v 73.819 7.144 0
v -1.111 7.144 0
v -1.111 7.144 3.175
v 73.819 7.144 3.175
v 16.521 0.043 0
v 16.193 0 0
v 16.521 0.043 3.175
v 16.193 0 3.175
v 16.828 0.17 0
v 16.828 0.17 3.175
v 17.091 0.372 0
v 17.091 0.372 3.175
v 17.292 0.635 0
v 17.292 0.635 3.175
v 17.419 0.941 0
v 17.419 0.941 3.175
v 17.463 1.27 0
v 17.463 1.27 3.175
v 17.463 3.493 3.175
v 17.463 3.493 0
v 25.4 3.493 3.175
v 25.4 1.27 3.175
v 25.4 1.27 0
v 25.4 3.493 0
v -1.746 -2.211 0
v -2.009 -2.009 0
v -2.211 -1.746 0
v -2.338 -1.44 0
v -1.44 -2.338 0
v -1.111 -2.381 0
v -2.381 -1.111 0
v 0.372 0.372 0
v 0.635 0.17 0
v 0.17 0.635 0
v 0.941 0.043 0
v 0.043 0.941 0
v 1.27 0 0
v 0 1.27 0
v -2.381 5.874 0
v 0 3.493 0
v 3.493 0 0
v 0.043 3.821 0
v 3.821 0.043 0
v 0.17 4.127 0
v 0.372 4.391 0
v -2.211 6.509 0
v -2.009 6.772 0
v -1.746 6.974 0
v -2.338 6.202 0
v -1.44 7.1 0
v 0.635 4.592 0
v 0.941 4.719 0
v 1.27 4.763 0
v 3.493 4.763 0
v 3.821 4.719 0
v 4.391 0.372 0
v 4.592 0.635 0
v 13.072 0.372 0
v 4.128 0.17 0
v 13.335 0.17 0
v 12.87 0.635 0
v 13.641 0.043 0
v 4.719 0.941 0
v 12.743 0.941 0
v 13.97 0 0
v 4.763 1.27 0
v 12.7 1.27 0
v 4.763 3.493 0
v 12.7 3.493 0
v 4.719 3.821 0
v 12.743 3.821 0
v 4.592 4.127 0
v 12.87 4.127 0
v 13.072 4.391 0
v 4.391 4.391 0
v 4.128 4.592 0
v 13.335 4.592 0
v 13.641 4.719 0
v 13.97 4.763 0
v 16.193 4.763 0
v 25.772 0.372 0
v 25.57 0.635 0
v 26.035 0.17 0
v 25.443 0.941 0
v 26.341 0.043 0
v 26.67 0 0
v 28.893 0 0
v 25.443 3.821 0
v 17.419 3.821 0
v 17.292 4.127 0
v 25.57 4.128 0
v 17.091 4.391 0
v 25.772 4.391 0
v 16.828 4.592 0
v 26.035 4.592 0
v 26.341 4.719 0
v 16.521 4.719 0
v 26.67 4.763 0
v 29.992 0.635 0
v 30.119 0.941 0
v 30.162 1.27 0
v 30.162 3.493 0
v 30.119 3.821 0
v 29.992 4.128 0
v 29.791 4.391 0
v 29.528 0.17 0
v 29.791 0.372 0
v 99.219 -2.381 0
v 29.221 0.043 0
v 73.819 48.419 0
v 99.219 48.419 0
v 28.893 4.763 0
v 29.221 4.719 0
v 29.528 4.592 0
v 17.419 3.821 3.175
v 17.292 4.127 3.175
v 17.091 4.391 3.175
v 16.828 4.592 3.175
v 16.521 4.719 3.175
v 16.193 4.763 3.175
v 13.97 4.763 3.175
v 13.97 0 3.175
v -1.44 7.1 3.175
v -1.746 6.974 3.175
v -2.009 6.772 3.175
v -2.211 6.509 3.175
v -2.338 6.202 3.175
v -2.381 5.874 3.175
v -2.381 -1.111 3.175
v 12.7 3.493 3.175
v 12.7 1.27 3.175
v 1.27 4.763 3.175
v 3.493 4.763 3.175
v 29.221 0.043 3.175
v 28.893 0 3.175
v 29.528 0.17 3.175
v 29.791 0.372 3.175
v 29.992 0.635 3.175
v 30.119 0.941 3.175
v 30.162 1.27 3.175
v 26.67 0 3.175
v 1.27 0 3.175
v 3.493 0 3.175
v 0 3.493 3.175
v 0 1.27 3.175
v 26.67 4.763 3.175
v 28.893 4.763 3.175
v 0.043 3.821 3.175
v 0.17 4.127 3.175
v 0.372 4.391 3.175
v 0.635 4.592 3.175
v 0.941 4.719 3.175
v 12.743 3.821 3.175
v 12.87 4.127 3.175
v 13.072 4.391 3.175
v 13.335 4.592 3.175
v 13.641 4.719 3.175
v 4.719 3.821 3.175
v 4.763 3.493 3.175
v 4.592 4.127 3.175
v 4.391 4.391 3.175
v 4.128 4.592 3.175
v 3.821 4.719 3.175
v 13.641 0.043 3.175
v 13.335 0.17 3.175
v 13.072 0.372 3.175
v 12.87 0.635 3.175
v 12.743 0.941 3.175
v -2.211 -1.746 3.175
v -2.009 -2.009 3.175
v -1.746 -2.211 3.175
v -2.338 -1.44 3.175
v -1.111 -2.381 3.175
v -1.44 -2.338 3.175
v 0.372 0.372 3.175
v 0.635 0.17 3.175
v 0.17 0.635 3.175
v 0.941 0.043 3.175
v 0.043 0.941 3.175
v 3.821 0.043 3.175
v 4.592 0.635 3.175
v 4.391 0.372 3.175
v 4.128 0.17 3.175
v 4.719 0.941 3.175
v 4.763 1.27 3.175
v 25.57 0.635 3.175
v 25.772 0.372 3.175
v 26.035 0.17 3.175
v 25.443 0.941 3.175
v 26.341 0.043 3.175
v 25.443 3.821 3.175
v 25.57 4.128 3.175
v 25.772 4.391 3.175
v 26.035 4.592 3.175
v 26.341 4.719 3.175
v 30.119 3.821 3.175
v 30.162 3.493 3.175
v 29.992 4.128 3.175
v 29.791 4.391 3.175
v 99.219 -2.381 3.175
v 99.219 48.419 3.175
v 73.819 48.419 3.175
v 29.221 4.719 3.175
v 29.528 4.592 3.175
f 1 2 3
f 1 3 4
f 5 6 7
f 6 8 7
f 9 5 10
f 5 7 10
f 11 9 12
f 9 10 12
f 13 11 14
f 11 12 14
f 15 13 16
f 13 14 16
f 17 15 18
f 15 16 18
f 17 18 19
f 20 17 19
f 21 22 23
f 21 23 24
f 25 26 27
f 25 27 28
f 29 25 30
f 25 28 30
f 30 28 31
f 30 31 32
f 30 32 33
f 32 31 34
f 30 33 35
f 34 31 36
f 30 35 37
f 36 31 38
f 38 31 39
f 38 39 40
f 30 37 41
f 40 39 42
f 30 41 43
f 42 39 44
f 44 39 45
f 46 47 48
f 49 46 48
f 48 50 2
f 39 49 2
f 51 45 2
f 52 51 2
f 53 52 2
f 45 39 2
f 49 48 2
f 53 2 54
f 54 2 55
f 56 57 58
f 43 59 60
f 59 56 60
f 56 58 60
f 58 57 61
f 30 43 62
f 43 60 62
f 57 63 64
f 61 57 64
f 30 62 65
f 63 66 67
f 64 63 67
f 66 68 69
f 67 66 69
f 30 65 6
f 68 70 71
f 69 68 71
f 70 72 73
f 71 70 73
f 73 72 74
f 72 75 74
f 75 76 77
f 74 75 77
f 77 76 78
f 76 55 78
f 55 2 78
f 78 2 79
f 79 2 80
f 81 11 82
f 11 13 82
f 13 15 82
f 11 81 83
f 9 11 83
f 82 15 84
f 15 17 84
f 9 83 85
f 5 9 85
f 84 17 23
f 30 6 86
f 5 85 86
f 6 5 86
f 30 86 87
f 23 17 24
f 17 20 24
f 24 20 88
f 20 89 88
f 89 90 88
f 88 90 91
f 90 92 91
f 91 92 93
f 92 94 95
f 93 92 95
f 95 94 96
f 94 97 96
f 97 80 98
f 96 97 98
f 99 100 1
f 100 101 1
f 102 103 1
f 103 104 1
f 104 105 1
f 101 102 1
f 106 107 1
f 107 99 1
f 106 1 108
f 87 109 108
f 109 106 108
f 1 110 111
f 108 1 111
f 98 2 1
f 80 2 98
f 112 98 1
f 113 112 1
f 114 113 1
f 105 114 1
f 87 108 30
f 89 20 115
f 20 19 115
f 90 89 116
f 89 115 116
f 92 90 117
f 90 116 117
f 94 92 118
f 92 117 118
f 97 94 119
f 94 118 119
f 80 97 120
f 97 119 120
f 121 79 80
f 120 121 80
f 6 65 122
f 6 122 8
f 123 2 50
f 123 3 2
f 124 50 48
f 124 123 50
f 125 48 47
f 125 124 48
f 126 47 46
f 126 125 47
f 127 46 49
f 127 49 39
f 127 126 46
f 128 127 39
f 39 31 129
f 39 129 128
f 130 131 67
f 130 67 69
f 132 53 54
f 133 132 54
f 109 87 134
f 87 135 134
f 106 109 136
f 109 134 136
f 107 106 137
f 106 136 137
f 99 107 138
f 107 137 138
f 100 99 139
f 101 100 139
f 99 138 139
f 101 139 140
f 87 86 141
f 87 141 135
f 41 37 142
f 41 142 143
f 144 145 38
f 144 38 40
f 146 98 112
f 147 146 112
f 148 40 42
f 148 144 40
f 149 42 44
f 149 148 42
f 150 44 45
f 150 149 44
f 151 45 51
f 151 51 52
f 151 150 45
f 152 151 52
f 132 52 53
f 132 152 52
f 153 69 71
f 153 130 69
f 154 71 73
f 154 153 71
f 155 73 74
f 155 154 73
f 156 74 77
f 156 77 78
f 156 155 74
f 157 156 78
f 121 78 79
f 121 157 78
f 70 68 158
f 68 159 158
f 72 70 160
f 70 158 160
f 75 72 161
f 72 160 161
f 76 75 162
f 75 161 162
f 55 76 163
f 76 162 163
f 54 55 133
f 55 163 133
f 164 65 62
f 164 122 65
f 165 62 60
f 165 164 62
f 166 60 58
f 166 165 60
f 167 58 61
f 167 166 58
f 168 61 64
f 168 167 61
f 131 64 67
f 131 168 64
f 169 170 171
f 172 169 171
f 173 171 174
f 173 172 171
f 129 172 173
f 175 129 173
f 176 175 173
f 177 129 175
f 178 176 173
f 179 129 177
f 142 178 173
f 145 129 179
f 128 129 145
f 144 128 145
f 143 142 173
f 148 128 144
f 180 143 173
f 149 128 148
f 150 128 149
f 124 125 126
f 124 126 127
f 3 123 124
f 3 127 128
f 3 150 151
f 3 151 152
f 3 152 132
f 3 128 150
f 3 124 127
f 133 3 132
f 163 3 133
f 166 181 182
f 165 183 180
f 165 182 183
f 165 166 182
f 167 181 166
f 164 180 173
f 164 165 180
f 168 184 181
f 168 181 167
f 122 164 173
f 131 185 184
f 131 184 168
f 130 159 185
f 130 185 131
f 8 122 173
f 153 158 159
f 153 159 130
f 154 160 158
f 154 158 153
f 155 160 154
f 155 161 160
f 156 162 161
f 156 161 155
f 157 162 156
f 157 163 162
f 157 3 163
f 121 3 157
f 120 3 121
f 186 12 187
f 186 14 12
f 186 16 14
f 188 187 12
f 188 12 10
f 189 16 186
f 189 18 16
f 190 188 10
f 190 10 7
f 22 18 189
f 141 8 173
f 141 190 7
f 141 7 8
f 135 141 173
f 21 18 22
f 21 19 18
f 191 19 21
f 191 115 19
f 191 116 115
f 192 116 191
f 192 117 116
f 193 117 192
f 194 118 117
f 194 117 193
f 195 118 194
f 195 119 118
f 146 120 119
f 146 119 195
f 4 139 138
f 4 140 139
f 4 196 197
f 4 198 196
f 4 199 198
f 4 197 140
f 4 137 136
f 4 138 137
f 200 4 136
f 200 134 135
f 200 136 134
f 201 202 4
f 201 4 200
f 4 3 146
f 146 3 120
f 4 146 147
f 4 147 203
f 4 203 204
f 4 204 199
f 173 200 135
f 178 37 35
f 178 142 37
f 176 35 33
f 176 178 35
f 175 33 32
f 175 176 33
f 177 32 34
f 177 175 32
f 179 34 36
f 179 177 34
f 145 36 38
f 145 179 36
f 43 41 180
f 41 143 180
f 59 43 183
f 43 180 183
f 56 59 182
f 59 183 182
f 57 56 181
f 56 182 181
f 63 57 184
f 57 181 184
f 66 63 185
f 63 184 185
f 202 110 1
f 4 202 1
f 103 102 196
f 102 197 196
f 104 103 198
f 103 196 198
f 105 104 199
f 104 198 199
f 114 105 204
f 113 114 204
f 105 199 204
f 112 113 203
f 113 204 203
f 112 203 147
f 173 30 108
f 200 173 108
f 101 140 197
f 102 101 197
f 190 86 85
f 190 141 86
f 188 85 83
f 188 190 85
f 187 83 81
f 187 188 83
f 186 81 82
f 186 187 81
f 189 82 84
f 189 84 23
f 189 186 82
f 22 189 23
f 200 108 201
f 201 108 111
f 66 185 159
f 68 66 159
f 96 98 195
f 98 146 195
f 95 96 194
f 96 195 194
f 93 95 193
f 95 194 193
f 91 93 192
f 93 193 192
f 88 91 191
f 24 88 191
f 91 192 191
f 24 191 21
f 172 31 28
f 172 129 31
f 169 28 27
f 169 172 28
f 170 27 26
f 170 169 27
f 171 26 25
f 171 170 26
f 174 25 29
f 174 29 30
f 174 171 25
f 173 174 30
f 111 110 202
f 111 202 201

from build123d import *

# Parameters (mm, degrees)
F0_W     = 25.4
F0_H     = 41.275
F0_H_2   = 9.525
F0_W_2   = 76.2
F0_W_3   = 4.7625
F0_H_3   = 4.7625
F1_DEPTH = 3.175
F2_R     = 1.27


with BuildPart() as f1:
    # F0 (on Top) → F1 (new body)
    with BuildSketch(Plane.XY):
        with Locations((86.51875, 27.78125)):
            Rectangle(F0_W, F0_H)
        with Locations((86.51875, 2.38125)):
            Rectangle(F0_W, F0_H_2)
        with Locations((35.71875, 2.38125)):
            Rectangle(F0_W_2, F0_H_2)
        with Locations((2.38125, 2.38125)):
            Rectangle(F0_W_3, F0_H_3, mode=Mode.SUBTRACT)
        with Locations((15.08125, 2.38125)):
            Rectangle(F0_W_3, F0_H_3, mode=Mode.SUBTRACT)
        with Locations((27.78125, 2.38125)):
            Rectangle(F0_W_3, F0_H_3, mode=Mode.SUBTRACT)
    extrude(amount=F1_DEPTH)

    # F2
    f2_edges = [f1.edges().sort_by_distance(p)[0] for p in [
        (-2.38125, -2.38125, 1.5875),
        (0, 4.7625, 1.5875),
        (12.7, 4.7625, 1.5875),
        (25.4, 4.7625, 1.5875),
        (-2.38125, 7.14375, 1.5875),
        (0, 0, 1.5875),
        (12.7, 0, 1.5875),
        (25.4, 0, 1.5875),
        (4.7625, 0, 1.5875),
        (17.4625, 0, 1.5875),
        (30.1625, 0, 1.5875),
        (4.7625, 4.7625, 1.5875),
        (17.4625, 4.7625, 1.5875),
        (30.1625, 4.7625, 1.5875),
    ]]
    fillet(f2_edges, radius=F2_R)


solid = f1.part
